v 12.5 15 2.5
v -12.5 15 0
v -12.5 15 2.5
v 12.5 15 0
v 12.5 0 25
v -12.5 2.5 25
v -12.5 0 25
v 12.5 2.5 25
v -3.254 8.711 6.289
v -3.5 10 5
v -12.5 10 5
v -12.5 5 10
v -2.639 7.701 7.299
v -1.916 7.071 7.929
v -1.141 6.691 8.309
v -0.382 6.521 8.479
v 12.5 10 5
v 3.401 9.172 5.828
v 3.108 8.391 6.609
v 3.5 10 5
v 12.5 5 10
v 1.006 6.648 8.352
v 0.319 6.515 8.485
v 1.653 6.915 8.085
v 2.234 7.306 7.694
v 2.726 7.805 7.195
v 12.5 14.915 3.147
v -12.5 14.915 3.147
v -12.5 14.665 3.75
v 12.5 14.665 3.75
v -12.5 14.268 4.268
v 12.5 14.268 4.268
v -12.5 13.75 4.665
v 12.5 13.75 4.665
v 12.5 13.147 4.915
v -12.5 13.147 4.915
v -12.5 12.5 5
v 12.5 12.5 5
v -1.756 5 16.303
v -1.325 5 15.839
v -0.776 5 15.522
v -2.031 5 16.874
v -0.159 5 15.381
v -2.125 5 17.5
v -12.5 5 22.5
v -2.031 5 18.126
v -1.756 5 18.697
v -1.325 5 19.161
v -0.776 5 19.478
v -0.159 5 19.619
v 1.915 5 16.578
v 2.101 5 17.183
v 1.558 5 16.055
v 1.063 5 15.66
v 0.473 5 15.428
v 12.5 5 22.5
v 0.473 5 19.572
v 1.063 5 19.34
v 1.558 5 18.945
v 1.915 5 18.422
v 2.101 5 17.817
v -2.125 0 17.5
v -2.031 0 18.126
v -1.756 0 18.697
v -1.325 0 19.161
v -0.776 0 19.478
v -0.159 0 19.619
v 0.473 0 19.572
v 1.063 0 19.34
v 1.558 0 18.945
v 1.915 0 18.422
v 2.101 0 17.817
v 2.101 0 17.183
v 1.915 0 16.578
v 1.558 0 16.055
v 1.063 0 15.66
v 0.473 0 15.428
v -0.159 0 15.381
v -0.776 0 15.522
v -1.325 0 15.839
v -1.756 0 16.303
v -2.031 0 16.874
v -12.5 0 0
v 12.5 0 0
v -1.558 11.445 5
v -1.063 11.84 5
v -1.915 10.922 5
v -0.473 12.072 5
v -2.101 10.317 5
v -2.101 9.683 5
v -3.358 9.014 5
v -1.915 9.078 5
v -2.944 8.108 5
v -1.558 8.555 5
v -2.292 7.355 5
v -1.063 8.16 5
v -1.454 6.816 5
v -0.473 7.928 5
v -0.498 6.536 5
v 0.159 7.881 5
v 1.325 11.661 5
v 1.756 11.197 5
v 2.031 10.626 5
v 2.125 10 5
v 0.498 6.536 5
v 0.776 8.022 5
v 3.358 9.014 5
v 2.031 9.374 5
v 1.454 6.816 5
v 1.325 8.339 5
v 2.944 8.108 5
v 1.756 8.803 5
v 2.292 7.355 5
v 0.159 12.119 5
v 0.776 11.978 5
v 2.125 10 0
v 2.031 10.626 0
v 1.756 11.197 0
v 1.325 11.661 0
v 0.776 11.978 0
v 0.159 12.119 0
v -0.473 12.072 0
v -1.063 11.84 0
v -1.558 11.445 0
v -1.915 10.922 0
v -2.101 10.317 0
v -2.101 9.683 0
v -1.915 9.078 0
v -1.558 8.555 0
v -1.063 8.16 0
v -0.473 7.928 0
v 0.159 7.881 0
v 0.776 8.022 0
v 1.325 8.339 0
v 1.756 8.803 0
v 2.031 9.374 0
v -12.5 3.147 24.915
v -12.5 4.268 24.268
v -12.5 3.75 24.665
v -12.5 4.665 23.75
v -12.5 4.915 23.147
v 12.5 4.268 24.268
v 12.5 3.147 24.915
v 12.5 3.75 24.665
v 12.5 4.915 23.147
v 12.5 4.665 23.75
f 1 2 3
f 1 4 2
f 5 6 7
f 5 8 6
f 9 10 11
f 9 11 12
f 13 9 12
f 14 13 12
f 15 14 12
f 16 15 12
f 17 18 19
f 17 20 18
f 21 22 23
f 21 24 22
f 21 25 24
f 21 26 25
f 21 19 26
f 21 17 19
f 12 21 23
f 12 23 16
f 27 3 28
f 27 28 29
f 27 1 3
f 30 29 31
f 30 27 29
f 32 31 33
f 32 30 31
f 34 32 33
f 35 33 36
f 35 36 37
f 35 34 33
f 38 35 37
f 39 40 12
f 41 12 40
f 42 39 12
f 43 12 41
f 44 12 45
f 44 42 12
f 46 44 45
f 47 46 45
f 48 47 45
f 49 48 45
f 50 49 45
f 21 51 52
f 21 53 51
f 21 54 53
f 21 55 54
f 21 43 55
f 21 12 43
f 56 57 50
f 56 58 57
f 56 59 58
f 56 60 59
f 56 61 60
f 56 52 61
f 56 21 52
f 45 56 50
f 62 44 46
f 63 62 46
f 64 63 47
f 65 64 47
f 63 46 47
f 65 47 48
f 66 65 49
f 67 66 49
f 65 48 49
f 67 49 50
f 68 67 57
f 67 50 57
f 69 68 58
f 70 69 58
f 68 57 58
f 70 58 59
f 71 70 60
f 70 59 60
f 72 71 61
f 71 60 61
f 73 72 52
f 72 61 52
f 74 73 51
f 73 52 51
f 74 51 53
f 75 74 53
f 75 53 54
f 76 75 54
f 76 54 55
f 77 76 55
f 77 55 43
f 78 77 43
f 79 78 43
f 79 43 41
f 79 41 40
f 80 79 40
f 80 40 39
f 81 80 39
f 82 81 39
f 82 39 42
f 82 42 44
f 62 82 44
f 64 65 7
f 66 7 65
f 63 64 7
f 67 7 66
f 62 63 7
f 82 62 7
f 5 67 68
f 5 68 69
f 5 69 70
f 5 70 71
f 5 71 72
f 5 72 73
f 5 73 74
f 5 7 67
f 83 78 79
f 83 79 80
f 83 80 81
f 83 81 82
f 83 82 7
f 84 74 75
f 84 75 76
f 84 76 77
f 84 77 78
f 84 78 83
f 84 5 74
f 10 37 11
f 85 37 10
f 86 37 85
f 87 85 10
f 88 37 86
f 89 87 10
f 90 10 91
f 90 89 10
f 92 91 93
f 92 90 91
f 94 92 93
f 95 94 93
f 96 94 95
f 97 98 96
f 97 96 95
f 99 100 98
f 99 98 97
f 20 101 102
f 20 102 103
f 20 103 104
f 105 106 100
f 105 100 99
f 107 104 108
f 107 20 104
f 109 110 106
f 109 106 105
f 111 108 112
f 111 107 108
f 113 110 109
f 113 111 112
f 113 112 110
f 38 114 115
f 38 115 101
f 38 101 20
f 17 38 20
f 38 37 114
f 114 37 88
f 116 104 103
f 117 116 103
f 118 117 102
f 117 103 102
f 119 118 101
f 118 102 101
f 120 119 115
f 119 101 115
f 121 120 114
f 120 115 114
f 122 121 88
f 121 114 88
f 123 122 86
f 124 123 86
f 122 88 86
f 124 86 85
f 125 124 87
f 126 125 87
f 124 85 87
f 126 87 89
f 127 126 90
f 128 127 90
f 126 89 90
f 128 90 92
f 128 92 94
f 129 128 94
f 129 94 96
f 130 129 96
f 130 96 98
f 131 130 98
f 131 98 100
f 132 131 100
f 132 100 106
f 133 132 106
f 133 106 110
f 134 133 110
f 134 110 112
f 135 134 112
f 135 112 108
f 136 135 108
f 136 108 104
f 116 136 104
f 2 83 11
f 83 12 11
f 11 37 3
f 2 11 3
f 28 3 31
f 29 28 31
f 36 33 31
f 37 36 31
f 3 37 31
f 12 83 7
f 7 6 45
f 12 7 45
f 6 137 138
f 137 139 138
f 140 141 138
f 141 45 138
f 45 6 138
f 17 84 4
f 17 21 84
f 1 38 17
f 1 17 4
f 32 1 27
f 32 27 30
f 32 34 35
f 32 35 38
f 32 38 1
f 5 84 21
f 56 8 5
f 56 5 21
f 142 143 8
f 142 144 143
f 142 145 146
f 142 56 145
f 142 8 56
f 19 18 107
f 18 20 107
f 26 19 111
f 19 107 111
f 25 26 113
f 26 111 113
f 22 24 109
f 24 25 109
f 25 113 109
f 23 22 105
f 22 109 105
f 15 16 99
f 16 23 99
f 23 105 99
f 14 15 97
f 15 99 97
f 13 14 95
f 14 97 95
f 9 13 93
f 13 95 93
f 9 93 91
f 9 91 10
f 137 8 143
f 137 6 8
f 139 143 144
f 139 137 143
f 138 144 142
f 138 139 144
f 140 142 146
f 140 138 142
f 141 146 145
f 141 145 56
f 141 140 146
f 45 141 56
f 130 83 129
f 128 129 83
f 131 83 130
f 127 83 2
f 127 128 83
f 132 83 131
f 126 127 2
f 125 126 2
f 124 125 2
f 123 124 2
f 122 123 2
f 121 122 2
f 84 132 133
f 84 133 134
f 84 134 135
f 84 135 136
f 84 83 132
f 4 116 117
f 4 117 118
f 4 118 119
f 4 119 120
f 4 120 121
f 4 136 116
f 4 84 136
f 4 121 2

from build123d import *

# Parameters (mm, degrees)
F1_DEPTH = 12.5
F2_R     = 2.125
F3_DEPTH = 5.001
F4_R     = 2.125
F5_DEPTH = 5.001
F6_R     = 2.5
F7_R     = 3.5
F8_DEPTH = 20.001


with BuildPart() as f1:
    # F0 (on Right) → F1 (new body, symmetric)
    with BuildSketch(Plane.YZ):
        Polygon((5, 25), (0, 25), (0, 0), (15, 0), (15, 5), (10, 5), (5, 10), align=None)
    extrude(amount=F1_DEPTH, both=True)

    # F2 (on face) → F3 (cut, through all)
    with BuildSketch(Plane.XY.offset(5)):
        with Locations((0, 10)):
            Circle(F2_R)
    extrude(amount=-F3_DEPTH, mode=Mode.SUBTRACT)

    # F4 (on face) → F5 (cut, through all)
    with BuildSketch(Plane(origin=(0, 5, 0), x_dir=(-1, 0, 0), z_dir=(0, 1, 0))):
        with Locations((0, 17.5)):
            Circle(F4_R)
    extrude(amount=-F5_DEPTH, mode=Mode.SUBTRACT)

    # F6
    f6_edges = [f1.edges().sort_by_distance(p)[0] for p in [
        (0, 15, 5),
        (0, 5, 25),
    ]]
    fillet(f6_edges, radius=F6_R)

    # F7 (on face) → F8 (cut, through all)
    with BuildSketch(Plane(origin=(0, 0, 5), x_dir=(1, 0, 0), z_dir=(0, 0, -1))):
        with Locations((0, -10)):
            Circle(F7_R)
    extrude(amount=-F8_DEPTH, mode=Mode.SUBTRACT)


solid = f1.part
